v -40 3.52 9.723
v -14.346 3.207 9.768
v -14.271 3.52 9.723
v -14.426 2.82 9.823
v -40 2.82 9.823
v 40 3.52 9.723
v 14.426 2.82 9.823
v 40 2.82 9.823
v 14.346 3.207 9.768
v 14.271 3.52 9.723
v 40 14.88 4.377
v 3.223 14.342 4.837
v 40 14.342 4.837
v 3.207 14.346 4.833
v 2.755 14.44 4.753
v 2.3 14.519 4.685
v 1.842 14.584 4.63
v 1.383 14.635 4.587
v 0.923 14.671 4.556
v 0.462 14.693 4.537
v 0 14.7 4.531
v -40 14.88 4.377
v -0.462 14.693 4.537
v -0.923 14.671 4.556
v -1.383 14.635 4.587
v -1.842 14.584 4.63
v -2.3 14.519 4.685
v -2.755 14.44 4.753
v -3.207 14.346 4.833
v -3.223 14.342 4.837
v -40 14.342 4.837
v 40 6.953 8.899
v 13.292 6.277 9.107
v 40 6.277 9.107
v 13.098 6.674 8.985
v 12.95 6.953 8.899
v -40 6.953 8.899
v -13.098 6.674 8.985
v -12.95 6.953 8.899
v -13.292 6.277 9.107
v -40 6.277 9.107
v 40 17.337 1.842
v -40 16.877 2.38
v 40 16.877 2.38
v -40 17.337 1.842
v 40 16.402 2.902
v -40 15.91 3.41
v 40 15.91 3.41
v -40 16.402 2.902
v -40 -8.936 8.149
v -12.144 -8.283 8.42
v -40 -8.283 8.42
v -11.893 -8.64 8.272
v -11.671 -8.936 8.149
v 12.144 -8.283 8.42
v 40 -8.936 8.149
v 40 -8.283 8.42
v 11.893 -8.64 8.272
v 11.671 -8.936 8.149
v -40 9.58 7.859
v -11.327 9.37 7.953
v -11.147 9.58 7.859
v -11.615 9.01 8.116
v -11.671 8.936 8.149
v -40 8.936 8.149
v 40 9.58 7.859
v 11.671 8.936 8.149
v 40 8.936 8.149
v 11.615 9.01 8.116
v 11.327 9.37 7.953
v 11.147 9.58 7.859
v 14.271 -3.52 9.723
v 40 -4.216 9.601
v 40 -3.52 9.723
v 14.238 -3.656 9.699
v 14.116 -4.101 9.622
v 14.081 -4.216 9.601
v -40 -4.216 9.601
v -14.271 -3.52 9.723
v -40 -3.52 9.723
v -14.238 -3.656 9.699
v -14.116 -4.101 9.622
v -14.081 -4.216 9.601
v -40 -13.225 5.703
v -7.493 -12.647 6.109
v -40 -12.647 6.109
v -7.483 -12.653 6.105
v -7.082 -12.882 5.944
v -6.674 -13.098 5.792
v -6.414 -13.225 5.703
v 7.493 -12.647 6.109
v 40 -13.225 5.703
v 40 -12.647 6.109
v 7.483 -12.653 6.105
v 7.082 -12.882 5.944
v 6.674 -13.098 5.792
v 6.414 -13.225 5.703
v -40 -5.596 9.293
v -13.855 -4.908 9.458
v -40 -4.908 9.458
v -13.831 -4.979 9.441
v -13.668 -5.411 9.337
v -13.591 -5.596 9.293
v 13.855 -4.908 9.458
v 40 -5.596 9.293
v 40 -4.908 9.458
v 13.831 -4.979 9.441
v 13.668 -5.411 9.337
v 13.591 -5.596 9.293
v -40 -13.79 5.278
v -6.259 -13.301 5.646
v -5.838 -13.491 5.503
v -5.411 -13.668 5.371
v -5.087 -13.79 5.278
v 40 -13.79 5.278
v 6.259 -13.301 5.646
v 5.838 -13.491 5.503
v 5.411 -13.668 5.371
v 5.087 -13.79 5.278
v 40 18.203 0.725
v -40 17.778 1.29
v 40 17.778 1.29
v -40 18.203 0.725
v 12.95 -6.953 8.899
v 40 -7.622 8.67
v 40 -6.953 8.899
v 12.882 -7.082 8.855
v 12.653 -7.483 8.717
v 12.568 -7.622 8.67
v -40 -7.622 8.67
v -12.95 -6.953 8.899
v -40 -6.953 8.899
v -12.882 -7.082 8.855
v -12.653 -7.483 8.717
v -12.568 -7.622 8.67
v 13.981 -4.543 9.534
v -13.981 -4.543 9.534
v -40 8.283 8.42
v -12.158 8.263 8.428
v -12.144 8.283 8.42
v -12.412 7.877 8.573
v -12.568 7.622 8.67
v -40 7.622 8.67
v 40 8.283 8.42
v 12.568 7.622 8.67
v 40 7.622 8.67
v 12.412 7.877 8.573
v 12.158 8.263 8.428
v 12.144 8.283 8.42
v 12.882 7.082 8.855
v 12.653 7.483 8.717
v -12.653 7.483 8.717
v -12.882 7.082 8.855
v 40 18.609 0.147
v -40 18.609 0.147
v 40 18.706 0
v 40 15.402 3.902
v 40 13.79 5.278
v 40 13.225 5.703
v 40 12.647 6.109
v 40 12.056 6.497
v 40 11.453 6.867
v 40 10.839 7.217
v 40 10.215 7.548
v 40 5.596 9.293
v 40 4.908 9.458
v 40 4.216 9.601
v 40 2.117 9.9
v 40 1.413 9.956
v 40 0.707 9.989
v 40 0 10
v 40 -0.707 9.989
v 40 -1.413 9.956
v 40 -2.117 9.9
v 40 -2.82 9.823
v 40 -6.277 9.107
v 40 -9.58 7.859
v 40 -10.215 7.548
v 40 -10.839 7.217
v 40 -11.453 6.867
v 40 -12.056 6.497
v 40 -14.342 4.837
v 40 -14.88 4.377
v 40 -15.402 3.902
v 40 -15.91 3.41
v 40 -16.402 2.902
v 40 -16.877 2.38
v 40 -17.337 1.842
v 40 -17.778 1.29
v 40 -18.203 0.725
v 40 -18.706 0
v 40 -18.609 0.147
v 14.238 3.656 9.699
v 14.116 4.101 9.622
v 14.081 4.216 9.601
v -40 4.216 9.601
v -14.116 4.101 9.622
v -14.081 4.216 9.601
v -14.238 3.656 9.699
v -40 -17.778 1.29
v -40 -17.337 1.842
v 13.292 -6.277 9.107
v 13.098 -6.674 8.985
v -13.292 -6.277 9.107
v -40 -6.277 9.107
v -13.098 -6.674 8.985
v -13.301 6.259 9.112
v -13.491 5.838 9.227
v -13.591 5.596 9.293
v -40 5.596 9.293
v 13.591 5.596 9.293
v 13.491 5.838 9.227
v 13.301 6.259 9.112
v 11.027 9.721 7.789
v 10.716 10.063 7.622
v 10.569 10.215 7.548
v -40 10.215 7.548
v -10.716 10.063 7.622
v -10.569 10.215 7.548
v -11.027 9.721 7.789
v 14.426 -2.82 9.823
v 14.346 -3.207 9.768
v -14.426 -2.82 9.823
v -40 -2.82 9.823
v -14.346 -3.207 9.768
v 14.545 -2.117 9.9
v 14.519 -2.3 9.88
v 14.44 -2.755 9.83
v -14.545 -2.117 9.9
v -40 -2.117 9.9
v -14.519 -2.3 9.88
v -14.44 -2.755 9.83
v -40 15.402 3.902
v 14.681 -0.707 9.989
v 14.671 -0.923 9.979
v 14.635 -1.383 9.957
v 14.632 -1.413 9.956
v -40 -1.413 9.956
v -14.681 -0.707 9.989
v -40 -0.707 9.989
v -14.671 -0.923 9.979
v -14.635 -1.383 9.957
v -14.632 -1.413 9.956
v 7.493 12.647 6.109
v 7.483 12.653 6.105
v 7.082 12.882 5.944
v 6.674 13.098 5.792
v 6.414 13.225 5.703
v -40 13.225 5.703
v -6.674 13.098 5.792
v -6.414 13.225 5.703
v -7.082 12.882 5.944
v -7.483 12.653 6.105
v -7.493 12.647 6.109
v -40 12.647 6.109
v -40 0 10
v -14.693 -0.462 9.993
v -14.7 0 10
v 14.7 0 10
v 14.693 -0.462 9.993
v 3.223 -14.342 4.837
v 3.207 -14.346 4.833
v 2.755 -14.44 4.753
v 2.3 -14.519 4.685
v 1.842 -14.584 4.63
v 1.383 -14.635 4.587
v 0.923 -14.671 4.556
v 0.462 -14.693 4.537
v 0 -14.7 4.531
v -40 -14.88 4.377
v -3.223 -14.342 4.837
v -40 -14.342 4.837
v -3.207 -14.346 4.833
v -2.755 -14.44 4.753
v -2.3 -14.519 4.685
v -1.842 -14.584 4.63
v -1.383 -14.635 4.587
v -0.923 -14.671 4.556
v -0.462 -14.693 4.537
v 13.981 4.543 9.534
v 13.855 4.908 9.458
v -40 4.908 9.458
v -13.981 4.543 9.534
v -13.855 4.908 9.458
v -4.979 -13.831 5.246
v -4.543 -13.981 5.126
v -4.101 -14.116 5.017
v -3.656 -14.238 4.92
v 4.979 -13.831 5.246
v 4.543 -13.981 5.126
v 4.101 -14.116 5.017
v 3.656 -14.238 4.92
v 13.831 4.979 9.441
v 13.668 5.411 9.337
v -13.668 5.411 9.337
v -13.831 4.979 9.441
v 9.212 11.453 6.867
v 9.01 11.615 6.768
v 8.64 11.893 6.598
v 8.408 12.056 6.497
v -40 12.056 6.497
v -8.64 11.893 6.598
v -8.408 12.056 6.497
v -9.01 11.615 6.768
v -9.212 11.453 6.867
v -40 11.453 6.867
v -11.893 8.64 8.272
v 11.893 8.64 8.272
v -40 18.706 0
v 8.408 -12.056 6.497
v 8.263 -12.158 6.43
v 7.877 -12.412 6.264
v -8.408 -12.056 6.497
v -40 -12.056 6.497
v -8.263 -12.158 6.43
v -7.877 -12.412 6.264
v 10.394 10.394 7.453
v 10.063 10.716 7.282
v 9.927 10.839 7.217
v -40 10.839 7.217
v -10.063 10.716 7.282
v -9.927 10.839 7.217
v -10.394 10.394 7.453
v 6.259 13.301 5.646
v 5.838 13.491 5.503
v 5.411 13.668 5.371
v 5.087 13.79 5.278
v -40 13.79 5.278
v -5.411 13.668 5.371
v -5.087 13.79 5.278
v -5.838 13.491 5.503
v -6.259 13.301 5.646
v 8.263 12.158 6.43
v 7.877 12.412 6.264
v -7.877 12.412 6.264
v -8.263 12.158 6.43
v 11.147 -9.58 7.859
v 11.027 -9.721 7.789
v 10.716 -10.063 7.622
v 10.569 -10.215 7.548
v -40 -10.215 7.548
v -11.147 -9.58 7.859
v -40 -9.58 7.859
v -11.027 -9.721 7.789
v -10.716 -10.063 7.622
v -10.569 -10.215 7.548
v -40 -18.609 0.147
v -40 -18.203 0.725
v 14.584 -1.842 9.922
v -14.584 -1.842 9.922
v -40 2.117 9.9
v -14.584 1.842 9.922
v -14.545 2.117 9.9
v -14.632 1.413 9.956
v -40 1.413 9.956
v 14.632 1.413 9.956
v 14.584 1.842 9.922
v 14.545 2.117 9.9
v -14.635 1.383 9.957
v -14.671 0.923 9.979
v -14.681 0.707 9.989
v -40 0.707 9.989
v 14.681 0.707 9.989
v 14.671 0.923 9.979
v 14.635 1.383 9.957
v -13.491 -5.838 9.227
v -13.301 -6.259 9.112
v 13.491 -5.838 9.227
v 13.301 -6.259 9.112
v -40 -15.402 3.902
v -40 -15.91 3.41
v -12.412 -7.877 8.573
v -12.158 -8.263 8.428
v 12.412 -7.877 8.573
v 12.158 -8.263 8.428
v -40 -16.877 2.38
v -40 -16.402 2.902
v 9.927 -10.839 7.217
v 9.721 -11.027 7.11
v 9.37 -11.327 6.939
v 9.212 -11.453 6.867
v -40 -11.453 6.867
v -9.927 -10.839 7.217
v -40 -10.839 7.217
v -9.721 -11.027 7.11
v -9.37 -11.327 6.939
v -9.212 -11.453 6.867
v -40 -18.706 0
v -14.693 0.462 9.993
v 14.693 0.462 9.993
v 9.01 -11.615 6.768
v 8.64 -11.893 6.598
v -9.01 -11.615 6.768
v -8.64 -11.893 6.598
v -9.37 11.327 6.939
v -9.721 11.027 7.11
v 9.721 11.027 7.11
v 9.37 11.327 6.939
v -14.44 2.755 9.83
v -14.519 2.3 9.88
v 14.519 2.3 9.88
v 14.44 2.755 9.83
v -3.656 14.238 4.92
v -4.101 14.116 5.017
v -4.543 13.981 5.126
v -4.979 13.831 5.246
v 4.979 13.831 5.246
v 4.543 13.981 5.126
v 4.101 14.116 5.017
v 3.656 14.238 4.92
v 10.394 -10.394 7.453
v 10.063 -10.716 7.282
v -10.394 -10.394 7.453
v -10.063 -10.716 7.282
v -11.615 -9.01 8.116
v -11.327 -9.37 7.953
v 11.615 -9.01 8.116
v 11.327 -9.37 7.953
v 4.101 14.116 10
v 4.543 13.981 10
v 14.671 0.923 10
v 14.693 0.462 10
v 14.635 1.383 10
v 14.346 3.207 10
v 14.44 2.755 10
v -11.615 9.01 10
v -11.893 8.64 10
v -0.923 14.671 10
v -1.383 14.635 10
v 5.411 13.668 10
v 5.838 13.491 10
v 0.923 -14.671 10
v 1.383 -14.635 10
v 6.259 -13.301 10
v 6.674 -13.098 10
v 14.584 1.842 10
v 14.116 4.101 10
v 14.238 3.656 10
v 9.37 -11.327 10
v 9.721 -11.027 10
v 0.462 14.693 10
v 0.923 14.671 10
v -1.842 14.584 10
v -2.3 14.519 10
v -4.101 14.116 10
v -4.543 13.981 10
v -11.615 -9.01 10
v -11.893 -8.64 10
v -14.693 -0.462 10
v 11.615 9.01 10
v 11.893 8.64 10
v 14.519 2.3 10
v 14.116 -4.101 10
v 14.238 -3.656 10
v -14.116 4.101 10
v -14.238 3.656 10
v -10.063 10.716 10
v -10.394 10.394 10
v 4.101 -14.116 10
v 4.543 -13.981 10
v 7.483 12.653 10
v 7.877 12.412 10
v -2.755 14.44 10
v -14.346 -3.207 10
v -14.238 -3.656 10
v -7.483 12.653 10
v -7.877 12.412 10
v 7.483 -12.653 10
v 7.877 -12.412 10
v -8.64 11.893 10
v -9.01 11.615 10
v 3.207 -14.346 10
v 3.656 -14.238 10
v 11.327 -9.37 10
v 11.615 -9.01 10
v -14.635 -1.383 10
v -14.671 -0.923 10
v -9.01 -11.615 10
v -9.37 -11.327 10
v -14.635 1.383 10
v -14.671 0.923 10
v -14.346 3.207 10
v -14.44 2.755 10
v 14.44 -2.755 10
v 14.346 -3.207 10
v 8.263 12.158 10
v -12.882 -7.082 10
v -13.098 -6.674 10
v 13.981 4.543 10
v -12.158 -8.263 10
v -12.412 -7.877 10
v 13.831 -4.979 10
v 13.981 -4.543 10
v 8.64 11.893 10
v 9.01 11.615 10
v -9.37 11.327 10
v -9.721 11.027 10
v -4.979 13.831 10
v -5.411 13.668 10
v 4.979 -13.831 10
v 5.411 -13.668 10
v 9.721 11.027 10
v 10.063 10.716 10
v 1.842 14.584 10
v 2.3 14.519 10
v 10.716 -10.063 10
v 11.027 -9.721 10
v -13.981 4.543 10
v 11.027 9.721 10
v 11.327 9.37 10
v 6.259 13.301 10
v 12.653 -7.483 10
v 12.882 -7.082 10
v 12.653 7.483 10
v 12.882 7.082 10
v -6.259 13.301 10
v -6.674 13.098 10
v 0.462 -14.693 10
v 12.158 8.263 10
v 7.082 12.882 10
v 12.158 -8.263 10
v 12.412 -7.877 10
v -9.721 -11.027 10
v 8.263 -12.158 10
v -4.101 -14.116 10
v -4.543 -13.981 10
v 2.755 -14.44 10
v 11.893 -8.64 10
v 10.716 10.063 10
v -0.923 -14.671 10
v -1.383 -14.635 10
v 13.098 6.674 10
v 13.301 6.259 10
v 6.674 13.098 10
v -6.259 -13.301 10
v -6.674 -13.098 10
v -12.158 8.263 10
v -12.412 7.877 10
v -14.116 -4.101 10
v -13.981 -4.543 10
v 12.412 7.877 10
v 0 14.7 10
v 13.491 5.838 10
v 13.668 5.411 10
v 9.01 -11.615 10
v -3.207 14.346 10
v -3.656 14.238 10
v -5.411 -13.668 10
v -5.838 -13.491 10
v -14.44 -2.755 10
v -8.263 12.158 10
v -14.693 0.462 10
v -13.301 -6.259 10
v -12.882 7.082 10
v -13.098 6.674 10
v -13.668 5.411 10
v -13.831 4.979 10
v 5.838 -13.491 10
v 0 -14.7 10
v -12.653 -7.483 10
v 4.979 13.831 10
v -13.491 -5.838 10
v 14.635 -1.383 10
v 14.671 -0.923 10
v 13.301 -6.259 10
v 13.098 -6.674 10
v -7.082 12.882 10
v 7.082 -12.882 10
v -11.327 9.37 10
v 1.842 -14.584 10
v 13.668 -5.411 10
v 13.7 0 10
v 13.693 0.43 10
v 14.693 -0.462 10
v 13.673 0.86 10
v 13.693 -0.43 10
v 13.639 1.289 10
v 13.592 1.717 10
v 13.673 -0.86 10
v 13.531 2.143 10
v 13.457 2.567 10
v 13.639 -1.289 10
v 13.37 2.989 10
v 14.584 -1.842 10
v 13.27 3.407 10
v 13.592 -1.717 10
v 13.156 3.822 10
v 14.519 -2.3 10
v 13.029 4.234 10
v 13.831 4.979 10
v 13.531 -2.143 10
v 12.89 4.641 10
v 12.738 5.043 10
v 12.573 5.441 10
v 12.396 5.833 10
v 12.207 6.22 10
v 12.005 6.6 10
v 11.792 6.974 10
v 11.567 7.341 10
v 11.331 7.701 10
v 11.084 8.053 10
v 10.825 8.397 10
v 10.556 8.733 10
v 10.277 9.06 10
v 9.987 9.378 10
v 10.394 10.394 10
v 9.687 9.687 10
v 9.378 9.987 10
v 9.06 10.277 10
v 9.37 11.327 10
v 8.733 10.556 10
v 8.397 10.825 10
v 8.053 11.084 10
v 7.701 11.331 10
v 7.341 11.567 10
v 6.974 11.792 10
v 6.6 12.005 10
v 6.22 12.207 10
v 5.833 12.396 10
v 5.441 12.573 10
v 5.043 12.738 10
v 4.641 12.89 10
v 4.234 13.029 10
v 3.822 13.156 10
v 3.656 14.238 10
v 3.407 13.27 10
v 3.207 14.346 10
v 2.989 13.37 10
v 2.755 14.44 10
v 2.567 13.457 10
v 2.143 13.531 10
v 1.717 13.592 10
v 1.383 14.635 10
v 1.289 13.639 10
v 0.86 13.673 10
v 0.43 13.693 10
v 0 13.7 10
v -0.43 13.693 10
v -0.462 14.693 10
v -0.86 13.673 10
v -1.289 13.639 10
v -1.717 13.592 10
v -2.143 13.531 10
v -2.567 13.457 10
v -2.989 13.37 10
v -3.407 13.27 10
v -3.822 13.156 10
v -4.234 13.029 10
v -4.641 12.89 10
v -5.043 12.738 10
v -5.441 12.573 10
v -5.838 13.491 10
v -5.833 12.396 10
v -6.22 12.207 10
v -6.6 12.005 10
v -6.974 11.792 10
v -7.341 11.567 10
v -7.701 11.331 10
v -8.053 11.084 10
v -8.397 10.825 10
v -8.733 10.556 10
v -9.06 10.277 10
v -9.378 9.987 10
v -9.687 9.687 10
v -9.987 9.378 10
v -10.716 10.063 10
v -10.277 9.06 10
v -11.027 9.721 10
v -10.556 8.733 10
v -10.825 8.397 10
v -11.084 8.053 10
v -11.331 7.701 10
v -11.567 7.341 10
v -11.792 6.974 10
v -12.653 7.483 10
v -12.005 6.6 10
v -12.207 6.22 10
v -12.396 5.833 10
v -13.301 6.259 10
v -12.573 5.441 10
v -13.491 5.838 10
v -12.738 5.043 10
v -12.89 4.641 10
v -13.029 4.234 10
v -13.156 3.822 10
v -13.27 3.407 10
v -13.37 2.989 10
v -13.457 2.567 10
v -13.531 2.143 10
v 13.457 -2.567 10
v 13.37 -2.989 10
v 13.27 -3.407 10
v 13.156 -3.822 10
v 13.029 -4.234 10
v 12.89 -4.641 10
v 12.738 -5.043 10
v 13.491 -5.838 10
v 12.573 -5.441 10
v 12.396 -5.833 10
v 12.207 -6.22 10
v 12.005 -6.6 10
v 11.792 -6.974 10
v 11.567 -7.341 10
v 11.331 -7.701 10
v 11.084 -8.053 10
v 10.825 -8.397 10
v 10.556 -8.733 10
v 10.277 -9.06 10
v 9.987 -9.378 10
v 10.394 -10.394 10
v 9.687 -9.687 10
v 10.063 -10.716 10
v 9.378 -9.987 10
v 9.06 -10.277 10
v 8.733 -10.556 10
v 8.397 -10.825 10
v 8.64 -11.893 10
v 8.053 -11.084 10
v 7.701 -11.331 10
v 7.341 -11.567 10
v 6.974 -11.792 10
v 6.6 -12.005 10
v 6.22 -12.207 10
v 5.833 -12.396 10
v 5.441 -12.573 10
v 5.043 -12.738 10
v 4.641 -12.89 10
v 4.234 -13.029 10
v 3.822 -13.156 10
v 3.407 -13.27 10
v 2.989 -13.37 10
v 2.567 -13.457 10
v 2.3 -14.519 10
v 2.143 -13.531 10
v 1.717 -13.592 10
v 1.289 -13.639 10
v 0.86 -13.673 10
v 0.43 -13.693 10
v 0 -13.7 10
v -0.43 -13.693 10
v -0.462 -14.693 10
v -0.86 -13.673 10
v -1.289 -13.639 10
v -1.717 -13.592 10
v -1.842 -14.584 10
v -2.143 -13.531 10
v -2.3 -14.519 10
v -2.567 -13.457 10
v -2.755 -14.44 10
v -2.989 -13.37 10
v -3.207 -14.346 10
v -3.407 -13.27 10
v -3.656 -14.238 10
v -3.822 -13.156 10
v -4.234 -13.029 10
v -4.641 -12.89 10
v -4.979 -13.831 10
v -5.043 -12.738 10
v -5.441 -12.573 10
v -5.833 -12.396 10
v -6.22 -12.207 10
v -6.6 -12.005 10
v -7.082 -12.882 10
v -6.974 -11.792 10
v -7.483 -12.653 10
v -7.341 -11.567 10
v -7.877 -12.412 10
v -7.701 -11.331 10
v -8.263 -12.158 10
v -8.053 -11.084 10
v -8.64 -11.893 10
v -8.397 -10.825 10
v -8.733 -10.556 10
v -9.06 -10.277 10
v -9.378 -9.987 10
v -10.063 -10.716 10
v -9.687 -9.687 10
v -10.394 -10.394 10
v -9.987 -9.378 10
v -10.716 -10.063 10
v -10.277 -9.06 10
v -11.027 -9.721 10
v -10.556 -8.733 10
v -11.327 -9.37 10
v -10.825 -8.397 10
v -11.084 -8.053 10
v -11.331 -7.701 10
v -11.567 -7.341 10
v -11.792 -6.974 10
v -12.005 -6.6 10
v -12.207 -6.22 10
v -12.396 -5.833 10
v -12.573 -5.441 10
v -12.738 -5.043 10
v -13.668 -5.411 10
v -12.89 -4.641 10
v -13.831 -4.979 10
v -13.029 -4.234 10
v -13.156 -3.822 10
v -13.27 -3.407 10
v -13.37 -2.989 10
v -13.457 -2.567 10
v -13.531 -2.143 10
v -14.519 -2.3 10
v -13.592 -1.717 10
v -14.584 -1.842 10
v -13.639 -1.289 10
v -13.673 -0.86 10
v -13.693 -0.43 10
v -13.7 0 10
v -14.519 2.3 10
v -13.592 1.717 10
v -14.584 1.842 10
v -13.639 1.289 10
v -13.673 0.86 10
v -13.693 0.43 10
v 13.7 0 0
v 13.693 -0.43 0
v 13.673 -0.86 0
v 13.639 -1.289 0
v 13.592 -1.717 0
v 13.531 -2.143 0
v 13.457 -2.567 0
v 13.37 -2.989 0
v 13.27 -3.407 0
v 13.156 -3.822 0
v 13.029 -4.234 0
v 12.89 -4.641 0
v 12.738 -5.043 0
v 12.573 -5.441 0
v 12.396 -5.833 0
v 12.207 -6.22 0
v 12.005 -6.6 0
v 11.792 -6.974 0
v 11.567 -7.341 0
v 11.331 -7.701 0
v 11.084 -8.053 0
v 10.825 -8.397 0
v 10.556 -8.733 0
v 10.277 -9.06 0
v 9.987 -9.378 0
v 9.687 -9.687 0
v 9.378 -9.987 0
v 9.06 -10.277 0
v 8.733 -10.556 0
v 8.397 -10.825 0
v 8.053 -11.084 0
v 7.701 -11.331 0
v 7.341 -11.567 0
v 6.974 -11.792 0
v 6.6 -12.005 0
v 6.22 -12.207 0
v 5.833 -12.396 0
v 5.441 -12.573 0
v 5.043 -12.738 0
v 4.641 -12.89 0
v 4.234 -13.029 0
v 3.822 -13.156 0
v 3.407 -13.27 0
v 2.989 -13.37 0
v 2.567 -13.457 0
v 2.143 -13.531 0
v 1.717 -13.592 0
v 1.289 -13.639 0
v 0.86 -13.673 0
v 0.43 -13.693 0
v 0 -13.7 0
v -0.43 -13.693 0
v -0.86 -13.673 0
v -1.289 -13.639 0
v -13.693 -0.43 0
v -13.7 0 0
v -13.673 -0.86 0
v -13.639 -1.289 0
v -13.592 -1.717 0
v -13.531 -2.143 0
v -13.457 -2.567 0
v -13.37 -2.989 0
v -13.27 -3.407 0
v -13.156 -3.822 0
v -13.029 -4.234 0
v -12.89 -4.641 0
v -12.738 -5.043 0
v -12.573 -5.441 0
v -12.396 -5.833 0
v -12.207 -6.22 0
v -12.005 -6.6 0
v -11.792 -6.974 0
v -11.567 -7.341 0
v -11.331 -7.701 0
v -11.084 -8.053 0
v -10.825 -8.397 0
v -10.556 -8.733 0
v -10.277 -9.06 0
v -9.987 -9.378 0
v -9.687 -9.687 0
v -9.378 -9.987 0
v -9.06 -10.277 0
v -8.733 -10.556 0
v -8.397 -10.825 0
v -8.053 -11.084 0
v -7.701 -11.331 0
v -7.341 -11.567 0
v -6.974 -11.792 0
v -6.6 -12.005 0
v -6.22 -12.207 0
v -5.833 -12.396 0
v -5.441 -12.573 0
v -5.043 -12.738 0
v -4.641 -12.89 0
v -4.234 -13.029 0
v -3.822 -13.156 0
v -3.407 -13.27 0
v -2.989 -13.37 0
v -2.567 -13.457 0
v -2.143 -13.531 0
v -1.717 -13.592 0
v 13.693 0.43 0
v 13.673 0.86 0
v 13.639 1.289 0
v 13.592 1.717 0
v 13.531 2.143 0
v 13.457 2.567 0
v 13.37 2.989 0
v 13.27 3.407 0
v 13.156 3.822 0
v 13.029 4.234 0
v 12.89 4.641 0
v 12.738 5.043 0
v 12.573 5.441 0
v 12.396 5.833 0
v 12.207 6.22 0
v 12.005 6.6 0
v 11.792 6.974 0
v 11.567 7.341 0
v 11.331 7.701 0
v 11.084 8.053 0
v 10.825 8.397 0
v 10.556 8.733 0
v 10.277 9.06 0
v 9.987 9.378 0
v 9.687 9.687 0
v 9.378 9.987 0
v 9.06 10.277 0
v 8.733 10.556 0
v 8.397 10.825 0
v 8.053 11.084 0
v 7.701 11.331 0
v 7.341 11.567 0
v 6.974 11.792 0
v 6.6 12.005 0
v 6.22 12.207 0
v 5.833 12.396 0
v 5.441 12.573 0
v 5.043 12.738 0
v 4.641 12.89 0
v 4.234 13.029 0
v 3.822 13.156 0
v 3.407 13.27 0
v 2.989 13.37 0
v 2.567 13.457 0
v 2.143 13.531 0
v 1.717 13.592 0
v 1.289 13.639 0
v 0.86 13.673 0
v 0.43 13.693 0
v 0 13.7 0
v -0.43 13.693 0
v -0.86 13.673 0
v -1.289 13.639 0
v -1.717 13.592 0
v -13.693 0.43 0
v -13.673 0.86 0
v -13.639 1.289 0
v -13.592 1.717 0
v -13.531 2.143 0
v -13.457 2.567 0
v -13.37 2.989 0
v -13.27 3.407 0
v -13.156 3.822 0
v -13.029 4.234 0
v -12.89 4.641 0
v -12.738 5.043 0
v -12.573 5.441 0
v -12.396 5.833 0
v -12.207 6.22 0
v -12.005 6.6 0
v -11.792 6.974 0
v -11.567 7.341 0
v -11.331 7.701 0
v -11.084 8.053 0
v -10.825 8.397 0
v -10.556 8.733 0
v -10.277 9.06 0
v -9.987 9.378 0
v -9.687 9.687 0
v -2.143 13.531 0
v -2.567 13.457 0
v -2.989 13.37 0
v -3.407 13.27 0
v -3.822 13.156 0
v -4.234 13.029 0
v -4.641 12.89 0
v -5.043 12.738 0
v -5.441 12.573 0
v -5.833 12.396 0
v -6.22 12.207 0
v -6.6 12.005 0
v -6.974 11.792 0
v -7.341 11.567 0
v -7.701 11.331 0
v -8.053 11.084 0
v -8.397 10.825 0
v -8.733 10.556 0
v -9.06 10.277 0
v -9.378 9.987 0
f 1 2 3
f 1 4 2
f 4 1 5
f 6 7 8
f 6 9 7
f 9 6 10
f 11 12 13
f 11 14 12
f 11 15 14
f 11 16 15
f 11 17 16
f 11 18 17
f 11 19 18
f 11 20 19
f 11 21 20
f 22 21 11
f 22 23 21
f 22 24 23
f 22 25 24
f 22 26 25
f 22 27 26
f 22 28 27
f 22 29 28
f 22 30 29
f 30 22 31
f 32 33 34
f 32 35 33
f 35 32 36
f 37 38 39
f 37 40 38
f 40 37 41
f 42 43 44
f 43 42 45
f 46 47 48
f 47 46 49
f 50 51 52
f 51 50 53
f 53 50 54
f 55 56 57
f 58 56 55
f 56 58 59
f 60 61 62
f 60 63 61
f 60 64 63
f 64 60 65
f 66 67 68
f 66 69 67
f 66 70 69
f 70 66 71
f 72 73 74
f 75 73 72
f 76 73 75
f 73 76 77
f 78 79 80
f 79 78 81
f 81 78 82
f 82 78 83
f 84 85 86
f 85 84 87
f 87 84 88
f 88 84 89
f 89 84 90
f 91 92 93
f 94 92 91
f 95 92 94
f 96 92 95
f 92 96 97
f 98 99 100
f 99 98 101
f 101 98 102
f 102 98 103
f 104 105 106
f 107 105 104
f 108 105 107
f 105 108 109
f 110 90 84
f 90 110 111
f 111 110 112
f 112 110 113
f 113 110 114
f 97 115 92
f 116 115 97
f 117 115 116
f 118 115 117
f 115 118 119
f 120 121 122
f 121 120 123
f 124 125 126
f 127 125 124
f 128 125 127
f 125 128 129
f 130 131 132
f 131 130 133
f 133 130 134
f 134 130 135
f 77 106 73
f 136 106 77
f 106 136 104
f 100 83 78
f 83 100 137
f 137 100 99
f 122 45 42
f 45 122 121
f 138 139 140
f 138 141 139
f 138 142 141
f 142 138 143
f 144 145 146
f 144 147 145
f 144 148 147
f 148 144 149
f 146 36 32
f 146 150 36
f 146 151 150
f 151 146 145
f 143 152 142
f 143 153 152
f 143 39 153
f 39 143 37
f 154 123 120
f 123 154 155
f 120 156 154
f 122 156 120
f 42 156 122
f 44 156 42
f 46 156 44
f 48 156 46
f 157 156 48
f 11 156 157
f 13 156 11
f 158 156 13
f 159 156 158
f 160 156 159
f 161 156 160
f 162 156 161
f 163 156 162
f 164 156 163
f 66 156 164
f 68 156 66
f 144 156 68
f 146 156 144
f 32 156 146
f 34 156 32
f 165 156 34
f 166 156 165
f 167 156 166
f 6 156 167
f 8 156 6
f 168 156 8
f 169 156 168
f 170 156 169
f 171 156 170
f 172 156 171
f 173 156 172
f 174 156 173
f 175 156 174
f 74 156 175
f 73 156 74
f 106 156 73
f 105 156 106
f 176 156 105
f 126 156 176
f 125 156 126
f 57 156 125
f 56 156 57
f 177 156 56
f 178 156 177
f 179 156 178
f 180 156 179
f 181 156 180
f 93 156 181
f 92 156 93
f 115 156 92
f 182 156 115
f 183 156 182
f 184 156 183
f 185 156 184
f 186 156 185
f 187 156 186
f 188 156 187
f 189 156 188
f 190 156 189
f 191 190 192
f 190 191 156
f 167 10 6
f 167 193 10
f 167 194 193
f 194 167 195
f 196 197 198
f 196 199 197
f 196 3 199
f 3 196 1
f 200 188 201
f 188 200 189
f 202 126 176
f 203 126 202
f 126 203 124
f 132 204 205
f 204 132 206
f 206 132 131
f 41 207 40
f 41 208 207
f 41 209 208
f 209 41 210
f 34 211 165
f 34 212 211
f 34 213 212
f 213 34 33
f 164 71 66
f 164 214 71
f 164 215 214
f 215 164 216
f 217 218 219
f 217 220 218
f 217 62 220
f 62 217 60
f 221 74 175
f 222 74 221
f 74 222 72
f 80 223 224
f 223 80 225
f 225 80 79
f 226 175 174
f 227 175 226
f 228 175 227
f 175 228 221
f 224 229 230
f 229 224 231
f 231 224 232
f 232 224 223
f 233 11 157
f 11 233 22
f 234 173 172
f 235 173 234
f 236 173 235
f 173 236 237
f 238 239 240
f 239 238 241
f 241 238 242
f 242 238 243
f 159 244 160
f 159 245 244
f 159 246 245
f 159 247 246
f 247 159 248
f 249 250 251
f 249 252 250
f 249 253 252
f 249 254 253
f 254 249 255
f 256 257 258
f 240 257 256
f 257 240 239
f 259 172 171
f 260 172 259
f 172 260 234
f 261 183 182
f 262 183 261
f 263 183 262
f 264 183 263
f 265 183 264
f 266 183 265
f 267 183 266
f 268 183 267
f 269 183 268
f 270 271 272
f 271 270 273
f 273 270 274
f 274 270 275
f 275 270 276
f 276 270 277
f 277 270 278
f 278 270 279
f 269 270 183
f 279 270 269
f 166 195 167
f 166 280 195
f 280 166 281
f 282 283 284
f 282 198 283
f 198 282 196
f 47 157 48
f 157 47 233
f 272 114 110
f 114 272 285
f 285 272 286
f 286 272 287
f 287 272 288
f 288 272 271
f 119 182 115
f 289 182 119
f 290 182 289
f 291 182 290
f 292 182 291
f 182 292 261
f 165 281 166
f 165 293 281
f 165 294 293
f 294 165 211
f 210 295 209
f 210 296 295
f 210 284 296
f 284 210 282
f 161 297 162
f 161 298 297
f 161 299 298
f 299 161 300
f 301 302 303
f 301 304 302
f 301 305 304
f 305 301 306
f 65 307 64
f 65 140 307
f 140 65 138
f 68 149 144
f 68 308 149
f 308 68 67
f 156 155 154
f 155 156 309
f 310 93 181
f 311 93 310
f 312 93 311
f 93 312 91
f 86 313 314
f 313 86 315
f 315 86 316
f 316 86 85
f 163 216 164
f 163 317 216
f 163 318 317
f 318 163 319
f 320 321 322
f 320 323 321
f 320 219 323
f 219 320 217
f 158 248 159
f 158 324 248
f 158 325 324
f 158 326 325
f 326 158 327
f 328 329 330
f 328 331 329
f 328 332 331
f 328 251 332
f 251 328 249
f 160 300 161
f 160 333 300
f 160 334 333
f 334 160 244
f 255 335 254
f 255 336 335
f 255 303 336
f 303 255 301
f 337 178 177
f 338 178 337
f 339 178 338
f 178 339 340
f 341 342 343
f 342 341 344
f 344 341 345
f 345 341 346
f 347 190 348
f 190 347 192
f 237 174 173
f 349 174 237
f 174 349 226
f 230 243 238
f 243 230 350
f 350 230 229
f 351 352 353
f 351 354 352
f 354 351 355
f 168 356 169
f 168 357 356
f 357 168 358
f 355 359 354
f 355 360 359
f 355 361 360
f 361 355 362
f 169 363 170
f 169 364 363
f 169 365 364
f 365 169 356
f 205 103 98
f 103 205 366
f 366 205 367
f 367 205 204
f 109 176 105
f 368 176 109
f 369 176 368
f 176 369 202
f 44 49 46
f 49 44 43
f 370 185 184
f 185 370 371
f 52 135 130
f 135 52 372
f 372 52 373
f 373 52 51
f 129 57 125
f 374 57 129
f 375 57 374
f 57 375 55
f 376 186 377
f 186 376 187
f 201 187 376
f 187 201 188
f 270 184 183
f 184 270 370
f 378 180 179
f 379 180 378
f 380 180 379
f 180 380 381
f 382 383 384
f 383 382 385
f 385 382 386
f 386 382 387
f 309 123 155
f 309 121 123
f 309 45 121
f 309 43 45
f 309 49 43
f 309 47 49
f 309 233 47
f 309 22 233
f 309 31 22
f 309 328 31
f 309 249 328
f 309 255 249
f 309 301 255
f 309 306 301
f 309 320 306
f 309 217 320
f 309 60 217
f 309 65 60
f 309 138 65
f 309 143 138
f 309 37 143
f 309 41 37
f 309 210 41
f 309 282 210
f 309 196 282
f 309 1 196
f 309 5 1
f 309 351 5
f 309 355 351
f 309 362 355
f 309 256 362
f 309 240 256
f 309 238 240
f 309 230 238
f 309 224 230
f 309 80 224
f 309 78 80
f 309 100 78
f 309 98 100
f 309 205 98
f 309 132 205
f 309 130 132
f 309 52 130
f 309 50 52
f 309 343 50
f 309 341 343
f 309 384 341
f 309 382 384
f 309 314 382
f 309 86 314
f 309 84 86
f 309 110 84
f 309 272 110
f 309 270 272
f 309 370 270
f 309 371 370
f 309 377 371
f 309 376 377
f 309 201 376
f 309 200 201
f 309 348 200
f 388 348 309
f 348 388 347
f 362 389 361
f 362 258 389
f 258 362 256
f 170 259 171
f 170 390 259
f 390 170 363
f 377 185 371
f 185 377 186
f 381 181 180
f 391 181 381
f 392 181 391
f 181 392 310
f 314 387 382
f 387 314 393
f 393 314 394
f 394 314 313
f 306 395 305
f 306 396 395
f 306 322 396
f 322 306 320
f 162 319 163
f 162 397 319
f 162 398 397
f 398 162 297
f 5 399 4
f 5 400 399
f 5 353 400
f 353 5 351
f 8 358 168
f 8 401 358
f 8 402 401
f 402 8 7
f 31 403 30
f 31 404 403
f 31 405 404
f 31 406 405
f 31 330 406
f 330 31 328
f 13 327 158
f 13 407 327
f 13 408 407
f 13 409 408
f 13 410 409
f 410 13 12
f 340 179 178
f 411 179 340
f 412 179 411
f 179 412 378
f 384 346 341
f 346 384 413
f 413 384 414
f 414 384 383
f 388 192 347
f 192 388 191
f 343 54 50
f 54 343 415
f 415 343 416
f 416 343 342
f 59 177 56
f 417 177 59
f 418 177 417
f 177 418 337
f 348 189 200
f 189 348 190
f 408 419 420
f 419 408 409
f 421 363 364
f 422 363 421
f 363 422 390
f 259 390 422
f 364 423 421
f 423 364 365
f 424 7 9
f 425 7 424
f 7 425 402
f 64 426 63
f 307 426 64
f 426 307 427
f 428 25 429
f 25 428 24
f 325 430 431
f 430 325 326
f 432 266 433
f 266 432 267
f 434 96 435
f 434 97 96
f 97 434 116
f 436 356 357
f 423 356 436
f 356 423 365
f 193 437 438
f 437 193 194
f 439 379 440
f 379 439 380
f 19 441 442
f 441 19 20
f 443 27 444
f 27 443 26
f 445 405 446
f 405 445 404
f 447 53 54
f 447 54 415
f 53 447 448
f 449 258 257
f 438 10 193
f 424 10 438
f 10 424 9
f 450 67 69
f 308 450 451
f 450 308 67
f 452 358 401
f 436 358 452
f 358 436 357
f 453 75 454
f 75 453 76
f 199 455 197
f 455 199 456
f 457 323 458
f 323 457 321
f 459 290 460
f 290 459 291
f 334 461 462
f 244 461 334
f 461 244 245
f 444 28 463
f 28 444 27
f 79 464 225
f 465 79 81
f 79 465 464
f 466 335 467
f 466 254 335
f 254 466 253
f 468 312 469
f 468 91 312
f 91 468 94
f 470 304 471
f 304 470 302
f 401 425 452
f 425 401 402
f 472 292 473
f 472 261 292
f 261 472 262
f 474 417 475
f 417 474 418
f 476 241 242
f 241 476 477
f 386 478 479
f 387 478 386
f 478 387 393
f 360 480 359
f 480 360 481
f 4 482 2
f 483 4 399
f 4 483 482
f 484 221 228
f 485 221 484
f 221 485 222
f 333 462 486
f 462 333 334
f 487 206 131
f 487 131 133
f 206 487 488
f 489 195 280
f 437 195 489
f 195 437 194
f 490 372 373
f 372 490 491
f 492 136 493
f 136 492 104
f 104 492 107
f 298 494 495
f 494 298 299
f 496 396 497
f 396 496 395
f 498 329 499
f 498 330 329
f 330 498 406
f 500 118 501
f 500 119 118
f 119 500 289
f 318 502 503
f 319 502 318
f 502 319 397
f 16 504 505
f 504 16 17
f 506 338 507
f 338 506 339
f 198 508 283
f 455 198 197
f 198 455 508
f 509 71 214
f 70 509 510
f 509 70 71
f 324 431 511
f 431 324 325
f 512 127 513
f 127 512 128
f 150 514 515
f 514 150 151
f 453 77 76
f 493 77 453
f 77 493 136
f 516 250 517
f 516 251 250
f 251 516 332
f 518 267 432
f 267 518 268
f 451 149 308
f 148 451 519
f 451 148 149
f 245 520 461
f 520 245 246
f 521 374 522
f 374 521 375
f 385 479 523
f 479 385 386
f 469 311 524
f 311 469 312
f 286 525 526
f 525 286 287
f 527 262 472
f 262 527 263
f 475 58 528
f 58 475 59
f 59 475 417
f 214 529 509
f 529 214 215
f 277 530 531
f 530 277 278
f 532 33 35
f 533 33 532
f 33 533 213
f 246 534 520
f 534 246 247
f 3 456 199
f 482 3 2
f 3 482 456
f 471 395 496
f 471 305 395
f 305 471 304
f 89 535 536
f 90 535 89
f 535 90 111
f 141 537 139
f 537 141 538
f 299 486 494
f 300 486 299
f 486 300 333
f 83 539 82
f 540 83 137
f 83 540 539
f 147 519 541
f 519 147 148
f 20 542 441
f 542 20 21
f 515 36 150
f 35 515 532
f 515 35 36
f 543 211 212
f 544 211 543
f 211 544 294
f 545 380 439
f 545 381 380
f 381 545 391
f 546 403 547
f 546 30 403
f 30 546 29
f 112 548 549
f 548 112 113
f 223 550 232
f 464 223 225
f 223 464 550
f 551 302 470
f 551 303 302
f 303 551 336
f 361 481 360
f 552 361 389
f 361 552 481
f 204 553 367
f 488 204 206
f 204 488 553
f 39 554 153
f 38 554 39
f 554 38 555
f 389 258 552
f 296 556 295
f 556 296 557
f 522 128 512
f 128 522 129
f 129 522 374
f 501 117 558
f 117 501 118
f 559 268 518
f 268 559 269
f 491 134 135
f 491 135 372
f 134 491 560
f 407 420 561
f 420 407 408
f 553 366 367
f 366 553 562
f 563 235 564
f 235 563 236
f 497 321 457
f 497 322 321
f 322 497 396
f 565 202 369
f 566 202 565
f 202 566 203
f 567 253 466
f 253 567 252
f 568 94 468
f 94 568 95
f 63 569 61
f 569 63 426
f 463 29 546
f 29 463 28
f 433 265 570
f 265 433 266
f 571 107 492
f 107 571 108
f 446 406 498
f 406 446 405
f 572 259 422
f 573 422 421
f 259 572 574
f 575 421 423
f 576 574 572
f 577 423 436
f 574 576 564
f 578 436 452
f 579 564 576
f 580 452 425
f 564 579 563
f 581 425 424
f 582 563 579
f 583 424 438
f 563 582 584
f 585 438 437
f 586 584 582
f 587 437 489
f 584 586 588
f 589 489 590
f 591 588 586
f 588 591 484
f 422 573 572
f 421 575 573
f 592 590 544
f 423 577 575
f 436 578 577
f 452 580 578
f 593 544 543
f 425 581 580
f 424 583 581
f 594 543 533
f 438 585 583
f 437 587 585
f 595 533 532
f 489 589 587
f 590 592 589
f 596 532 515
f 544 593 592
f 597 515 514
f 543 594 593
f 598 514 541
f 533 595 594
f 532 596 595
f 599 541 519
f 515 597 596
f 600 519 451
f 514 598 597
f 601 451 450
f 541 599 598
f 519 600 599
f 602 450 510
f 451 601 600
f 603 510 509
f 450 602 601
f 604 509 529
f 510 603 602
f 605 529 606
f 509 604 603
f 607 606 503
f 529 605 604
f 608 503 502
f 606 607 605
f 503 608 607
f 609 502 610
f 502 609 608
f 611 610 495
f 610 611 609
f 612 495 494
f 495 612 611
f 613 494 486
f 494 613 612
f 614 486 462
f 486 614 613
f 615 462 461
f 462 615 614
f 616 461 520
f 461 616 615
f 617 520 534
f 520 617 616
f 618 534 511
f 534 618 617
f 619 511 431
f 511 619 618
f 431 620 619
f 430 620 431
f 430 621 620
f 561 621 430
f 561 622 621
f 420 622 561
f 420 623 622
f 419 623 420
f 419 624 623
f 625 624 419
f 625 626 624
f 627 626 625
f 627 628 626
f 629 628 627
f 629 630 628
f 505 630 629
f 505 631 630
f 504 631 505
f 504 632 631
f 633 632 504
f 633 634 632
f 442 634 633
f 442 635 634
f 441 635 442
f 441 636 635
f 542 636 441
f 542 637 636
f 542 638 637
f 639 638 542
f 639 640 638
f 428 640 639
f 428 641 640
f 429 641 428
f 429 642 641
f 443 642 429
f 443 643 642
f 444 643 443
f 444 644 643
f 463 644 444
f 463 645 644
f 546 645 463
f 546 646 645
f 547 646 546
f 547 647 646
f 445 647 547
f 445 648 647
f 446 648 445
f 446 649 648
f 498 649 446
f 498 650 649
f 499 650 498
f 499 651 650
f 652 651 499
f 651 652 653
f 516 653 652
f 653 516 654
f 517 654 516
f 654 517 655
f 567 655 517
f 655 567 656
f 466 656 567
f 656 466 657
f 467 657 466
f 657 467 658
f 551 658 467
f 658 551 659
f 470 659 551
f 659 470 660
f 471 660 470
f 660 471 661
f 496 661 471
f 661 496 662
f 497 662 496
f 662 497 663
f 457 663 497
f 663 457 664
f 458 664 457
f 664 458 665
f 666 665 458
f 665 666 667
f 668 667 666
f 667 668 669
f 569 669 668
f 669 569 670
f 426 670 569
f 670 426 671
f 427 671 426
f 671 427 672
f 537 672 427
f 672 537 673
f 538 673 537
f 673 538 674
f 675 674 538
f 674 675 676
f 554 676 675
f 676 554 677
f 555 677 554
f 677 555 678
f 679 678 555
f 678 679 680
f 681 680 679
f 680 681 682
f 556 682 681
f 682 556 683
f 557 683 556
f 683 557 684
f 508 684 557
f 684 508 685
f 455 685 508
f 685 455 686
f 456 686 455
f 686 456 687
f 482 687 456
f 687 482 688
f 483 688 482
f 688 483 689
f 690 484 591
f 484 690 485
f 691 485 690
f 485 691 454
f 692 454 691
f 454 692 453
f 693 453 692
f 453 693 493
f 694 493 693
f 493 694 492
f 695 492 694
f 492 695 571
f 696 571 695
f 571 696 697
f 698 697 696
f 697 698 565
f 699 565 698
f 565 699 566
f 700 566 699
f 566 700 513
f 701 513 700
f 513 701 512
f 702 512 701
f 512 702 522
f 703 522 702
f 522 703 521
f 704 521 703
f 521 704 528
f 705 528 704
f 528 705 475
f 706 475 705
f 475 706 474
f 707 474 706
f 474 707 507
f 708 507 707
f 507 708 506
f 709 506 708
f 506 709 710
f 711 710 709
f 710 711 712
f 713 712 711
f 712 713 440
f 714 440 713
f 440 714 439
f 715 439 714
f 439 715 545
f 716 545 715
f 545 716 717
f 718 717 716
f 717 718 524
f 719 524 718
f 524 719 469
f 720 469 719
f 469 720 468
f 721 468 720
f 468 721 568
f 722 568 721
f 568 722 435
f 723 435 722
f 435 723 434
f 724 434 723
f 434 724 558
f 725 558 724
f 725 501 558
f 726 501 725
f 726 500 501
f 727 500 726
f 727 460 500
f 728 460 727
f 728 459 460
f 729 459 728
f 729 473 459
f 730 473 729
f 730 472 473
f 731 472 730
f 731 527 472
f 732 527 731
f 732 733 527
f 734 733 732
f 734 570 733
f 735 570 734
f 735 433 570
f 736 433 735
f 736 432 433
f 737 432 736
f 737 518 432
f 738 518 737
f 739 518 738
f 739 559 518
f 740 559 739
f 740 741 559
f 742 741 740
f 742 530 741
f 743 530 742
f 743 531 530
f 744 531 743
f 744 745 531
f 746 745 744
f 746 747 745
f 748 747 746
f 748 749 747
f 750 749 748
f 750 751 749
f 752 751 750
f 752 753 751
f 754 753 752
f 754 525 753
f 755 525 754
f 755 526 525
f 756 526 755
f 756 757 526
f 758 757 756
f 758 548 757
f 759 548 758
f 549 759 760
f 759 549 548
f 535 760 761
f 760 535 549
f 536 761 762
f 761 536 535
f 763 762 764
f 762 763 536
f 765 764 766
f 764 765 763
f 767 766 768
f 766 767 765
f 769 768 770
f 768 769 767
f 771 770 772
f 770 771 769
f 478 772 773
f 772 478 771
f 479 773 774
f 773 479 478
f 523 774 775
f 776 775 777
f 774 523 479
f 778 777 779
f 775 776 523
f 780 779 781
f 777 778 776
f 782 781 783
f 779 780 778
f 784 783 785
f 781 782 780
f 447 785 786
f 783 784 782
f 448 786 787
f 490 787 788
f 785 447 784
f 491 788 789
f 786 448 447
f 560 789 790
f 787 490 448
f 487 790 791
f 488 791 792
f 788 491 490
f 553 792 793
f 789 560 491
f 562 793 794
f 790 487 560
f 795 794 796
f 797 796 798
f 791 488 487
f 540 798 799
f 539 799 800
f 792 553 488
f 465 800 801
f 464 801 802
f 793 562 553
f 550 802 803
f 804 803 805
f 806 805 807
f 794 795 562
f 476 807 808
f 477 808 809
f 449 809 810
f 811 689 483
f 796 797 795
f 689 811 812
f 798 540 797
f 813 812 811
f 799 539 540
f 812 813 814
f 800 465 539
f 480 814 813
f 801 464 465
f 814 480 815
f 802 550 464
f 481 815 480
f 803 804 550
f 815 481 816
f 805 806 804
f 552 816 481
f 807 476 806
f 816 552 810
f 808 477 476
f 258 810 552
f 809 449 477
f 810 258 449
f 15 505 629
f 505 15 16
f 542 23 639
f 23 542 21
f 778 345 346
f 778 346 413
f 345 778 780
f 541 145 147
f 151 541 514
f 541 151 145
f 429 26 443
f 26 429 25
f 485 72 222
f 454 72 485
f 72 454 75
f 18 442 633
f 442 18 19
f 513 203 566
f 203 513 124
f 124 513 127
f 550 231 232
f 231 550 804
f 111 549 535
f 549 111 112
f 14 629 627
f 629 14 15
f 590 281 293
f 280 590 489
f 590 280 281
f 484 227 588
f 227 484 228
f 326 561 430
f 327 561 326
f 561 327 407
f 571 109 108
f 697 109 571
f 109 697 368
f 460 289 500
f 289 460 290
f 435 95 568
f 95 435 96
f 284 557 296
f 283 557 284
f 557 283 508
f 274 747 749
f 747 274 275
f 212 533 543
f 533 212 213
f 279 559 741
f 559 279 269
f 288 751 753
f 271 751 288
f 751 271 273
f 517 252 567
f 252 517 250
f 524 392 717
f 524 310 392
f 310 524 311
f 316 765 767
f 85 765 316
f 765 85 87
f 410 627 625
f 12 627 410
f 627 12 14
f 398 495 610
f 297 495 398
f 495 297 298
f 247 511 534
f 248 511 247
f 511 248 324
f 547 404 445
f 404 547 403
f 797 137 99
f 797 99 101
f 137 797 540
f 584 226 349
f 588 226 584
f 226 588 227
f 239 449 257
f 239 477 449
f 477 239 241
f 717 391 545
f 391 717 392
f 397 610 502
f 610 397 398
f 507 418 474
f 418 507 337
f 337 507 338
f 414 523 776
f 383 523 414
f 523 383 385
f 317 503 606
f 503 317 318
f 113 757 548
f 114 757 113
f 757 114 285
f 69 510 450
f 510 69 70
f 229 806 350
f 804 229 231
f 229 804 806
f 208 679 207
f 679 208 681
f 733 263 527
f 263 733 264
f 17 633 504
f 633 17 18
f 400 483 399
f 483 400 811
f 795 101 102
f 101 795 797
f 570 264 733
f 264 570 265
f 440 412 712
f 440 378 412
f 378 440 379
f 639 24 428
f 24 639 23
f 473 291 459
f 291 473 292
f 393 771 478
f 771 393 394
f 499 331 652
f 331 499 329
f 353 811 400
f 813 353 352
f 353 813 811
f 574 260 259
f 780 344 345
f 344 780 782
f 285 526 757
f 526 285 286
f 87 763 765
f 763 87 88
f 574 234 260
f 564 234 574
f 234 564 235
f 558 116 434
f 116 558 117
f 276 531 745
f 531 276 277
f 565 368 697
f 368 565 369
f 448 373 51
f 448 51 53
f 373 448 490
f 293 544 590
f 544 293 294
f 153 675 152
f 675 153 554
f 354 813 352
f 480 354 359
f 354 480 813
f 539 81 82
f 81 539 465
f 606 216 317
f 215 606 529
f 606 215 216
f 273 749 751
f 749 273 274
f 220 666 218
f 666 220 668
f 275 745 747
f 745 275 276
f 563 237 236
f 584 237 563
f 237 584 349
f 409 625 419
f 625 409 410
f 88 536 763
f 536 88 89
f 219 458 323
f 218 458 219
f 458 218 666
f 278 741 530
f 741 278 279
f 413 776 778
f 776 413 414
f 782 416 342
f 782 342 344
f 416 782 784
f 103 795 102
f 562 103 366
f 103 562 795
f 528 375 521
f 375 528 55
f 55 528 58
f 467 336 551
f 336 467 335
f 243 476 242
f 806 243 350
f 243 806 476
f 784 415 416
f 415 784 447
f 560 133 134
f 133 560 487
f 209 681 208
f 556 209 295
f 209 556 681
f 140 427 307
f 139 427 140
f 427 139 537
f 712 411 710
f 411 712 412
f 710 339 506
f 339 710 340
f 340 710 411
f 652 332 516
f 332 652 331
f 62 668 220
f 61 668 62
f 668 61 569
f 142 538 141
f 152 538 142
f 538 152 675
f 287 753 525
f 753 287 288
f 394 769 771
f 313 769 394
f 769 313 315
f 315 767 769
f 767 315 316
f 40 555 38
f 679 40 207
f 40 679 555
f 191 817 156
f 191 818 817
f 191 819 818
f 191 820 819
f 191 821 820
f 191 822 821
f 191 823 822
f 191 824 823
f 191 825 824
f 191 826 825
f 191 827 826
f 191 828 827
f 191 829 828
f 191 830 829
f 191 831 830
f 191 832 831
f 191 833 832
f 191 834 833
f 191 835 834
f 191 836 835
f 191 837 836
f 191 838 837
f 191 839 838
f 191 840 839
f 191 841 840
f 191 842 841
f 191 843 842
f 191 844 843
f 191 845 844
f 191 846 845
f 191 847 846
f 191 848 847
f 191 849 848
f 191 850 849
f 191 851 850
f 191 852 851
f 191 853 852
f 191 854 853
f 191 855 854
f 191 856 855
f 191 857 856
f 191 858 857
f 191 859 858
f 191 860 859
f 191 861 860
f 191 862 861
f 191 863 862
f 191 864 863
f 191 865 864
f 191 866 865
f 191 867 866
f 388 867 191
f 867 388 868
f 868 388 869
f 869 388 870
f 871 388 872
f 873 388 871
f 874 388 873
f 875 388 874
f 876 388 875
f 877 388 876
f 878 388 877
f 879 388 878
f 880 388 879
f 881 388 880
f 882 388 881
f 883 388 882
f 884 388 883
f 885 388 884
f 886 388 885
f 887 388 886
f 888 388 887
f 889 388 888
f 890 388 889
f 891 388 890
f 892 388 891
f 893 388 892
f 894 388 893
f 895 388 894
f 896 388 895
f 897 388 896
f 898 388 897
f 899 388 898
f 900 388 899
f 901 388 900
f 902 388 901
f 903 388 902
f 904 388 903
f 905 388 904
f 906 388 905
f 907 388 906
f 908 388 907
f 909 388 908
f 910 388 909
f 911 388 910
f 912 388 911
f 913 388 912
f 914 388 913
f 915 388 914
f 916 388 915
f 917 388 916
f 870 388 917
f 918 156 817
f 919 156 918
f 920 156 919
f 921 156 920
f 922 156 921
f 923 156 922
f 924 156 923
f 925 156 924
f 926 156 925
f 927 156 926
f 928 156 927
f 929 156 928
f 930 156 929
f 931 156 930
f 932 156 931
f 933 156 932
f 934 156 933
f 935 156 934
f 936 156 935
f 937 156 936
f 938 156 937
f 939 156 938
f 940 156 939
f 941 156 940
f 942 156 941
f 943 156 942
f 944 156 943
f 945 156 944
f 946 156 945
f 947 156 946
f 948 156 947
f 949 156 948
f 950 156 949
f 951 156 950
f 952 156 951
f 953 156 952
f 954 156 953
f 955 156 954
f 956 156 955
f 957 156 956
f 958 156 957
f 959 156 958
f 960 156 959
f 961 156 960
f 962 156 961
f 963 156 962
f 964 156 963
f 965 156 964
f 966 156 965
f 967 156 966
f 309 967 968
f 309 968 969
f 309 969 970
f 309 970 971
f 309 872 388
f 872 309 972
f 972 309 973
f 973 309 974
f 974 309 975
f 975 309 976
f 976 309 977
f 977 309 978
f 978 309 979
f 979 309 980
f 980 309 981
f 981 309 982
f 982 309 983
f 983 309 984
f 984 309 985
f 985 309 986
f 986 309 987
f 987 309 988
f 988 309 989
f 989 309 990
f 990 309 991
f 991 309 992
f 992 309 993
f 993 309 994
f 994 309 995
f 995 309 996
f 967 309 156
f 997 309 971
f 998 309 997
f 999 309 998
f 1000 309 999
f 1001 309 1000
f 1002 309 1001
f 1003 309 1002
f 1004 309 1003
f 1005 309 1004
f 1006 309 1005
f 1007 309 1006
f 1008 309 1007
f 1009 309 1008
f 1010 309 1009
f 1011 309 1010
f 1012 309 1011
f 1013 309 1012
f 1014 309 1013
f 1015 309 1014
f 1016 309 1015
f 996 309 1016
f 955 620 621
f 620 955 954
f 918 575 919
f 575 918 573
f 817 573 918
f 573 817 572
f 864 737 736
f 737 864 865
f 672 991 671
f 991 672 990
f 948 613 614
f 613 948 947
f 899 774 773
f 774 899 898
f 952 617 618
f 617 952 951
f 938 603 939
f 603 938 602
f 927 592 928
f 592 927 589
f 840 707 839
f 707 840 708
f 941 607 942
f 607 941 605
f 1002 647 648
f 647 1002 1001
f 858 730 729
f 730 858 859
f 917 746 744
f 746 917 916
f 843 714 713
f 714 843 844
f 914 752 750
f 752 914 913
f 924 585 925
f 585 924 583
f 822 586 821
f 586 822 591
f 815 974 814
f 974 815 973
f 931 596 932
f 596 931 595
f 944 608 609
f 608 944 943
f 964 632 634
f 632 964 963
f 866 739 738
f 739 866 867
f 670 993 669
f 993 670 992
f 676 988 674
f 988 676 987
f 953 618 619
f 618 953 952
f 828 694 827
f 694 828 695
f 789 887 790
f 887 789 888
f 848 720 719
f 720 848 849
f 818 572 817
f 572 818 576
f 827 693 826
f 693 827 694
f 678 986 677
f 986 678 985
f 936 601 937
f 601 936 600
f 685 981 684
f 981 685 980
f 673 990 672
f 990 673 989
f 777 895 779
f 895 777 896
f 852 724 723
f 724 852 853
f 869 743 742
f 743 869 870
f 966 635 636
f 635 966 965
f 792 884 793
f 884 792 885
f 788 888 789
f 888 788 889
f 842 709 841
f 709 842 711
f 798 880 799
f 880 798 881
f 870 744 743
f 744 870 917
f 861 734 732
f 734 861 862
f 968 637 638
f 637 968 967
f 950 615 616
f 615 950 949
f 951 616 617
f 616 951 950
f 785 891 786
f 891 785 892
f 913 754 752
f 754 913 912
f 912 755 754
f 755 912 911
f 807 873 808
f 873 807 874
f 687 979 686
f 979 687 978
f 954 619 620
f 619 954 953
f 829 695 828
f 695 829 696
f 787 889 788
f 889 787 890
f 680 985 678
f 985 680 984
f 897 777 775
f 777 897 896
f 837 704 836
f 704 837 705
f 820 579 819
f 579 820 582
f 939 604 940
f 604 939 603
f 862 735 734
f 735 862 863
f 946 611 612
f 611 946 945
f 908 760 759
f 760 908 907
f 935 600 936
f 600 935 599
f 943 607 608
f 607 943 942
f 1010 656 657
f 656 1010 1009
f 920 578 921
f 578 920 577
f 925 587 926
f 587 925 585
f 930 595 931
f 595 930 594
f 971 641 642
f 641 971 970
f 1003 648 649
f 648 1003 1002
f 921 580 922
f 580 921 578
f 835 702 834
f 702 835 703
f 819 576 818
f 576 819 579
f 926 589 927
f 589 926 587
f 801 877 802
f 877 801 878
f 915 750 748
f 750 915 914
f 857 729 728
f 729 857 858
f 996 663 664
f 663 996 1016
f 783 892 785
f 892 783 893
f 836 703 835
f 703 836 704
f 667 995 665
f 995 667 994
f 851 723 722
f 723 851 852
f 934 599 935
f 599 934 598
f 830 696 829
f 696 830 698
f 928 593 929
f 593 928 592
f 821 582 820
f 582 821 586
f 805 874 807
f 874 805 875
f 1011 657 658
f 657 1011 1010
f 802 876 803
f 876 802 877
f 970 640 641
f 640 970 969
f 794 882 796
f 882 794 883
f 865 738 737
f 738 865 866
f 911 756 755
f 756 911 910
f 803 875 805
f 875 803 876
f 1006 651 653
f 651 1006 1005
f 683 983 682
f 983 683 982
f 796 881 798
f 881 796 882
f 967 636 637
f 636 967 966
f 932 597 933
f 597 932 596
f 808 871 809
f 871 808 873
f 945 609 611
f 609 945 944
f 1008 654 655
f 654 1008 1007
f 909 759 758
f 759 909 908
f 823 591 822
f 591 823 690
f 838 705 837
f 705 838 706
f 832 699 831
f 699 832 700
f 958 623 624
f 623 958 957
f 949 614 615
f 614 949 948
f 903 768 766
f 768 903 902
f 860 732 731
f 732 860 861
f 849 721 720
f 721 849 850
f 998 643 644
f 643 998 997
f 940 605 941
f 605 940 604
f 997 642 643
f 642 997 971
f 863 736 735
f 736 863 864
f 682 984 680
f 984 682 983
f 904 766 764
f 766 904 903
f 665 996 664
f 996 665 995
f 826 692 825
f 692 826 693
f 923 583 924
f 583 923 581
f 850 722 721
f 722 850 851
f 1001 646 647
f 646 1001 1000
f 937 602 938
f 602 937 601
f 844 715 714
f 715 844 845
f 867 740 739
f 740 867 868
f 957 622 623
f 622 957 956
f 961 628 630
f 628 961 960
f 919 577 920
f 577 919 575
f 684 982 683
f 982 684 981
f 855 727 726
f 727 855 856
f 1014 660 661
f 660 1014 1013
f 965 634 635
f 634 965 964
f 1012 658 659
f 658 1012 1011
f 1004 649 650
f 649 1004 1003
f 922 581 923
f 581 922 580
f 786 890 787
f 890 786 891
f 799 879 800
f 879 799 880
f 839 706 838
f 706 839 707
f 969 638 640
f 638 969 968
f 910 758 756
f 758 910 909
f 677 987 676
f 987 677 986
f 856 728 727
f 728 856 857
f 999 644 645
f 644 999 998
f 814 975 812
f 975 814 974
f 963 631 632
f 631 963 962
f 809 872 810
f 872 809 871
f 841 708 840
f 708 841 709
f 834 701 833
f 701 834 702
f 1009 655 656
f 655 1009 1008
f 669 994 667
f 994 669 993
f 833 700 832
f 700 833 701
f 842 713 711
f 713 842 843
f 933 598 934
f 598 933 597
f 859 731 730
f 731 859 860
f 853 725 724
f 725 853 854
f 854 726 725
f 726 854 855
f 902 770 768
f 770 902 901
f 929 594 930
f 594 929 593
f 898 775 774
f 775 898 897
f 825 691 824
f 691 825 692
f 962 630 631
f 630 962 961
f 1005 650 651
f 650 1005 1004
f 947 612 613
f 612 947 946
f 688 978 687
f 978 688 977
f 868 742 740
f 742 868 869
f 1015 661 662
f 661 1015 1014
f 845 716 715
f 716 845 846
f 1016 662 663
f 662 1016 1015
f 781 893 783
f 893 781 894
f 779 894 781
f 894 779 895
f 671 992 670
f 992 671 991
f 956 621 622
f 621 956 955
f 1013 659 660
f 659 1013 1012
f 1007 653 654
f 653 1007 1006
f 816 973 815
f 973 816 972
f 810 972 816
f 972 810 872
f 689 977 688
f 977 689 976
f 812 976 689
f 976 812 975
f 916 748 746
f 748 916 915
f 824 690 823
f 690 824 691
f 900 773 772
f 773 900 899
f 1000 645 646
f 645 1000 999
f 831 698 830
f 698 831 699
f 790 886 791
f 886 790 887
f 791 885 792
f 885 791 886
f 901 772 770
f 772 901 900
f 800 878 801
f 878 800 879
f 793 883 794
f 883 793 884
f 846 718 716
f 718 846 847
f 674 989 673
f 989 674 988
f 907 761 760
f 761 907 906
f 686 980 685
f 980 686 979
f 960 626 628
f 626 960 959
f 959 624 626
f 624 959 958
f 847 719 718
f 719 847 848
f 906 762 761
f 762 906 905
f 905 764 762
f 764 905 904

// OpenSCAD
// whole part curve (diameter)
d = 45; // [30:100]
// height of the part
h = 10; // [5:20]
// length of the part
l = 80; // [30:150]
// thickness of the tube
thickness = 1; // [0.2:0.1:3]
// tolerence space between the tube and blade
tolerence = 2; // [0.2:0.1:5]

// resolution
$fn = 200;

/* [Animation] */
// rotating animation
animation_rotation = false;

/* [Hidden] */
is_animated = animation_rotation;
$vpt = is_animated?[0, 0, 0]:$vpt;
$vpr = is_animated?[60, 0, animation_rotation?(365 * $t):45]:$vpr;  // animation rotate around the object
$vpd = is_animated?200:$vpd;

// epsilon
epsi = 0.01;

saberSupport();

module saberSupport() {
    INCH = 25.4;
    hole = INCH + tolerence;
    difference() {
        union() {
            color("Silver")
                translate([0, 0, -d / 2 + h])
                    rotate([0, 90, 0])
                        cylinder(d = d, h = l, center = true);
            color("Gray")
                cylinder(d = hole + thickness * 2, h = h);
        }
        translate([0, 0, -d / 2])
            cube([l + epsi, d + epsi, d], center = true);
        // balde hole
        color("red")
            cylinder(d = hole, h = 80, center = true);
    }
}
